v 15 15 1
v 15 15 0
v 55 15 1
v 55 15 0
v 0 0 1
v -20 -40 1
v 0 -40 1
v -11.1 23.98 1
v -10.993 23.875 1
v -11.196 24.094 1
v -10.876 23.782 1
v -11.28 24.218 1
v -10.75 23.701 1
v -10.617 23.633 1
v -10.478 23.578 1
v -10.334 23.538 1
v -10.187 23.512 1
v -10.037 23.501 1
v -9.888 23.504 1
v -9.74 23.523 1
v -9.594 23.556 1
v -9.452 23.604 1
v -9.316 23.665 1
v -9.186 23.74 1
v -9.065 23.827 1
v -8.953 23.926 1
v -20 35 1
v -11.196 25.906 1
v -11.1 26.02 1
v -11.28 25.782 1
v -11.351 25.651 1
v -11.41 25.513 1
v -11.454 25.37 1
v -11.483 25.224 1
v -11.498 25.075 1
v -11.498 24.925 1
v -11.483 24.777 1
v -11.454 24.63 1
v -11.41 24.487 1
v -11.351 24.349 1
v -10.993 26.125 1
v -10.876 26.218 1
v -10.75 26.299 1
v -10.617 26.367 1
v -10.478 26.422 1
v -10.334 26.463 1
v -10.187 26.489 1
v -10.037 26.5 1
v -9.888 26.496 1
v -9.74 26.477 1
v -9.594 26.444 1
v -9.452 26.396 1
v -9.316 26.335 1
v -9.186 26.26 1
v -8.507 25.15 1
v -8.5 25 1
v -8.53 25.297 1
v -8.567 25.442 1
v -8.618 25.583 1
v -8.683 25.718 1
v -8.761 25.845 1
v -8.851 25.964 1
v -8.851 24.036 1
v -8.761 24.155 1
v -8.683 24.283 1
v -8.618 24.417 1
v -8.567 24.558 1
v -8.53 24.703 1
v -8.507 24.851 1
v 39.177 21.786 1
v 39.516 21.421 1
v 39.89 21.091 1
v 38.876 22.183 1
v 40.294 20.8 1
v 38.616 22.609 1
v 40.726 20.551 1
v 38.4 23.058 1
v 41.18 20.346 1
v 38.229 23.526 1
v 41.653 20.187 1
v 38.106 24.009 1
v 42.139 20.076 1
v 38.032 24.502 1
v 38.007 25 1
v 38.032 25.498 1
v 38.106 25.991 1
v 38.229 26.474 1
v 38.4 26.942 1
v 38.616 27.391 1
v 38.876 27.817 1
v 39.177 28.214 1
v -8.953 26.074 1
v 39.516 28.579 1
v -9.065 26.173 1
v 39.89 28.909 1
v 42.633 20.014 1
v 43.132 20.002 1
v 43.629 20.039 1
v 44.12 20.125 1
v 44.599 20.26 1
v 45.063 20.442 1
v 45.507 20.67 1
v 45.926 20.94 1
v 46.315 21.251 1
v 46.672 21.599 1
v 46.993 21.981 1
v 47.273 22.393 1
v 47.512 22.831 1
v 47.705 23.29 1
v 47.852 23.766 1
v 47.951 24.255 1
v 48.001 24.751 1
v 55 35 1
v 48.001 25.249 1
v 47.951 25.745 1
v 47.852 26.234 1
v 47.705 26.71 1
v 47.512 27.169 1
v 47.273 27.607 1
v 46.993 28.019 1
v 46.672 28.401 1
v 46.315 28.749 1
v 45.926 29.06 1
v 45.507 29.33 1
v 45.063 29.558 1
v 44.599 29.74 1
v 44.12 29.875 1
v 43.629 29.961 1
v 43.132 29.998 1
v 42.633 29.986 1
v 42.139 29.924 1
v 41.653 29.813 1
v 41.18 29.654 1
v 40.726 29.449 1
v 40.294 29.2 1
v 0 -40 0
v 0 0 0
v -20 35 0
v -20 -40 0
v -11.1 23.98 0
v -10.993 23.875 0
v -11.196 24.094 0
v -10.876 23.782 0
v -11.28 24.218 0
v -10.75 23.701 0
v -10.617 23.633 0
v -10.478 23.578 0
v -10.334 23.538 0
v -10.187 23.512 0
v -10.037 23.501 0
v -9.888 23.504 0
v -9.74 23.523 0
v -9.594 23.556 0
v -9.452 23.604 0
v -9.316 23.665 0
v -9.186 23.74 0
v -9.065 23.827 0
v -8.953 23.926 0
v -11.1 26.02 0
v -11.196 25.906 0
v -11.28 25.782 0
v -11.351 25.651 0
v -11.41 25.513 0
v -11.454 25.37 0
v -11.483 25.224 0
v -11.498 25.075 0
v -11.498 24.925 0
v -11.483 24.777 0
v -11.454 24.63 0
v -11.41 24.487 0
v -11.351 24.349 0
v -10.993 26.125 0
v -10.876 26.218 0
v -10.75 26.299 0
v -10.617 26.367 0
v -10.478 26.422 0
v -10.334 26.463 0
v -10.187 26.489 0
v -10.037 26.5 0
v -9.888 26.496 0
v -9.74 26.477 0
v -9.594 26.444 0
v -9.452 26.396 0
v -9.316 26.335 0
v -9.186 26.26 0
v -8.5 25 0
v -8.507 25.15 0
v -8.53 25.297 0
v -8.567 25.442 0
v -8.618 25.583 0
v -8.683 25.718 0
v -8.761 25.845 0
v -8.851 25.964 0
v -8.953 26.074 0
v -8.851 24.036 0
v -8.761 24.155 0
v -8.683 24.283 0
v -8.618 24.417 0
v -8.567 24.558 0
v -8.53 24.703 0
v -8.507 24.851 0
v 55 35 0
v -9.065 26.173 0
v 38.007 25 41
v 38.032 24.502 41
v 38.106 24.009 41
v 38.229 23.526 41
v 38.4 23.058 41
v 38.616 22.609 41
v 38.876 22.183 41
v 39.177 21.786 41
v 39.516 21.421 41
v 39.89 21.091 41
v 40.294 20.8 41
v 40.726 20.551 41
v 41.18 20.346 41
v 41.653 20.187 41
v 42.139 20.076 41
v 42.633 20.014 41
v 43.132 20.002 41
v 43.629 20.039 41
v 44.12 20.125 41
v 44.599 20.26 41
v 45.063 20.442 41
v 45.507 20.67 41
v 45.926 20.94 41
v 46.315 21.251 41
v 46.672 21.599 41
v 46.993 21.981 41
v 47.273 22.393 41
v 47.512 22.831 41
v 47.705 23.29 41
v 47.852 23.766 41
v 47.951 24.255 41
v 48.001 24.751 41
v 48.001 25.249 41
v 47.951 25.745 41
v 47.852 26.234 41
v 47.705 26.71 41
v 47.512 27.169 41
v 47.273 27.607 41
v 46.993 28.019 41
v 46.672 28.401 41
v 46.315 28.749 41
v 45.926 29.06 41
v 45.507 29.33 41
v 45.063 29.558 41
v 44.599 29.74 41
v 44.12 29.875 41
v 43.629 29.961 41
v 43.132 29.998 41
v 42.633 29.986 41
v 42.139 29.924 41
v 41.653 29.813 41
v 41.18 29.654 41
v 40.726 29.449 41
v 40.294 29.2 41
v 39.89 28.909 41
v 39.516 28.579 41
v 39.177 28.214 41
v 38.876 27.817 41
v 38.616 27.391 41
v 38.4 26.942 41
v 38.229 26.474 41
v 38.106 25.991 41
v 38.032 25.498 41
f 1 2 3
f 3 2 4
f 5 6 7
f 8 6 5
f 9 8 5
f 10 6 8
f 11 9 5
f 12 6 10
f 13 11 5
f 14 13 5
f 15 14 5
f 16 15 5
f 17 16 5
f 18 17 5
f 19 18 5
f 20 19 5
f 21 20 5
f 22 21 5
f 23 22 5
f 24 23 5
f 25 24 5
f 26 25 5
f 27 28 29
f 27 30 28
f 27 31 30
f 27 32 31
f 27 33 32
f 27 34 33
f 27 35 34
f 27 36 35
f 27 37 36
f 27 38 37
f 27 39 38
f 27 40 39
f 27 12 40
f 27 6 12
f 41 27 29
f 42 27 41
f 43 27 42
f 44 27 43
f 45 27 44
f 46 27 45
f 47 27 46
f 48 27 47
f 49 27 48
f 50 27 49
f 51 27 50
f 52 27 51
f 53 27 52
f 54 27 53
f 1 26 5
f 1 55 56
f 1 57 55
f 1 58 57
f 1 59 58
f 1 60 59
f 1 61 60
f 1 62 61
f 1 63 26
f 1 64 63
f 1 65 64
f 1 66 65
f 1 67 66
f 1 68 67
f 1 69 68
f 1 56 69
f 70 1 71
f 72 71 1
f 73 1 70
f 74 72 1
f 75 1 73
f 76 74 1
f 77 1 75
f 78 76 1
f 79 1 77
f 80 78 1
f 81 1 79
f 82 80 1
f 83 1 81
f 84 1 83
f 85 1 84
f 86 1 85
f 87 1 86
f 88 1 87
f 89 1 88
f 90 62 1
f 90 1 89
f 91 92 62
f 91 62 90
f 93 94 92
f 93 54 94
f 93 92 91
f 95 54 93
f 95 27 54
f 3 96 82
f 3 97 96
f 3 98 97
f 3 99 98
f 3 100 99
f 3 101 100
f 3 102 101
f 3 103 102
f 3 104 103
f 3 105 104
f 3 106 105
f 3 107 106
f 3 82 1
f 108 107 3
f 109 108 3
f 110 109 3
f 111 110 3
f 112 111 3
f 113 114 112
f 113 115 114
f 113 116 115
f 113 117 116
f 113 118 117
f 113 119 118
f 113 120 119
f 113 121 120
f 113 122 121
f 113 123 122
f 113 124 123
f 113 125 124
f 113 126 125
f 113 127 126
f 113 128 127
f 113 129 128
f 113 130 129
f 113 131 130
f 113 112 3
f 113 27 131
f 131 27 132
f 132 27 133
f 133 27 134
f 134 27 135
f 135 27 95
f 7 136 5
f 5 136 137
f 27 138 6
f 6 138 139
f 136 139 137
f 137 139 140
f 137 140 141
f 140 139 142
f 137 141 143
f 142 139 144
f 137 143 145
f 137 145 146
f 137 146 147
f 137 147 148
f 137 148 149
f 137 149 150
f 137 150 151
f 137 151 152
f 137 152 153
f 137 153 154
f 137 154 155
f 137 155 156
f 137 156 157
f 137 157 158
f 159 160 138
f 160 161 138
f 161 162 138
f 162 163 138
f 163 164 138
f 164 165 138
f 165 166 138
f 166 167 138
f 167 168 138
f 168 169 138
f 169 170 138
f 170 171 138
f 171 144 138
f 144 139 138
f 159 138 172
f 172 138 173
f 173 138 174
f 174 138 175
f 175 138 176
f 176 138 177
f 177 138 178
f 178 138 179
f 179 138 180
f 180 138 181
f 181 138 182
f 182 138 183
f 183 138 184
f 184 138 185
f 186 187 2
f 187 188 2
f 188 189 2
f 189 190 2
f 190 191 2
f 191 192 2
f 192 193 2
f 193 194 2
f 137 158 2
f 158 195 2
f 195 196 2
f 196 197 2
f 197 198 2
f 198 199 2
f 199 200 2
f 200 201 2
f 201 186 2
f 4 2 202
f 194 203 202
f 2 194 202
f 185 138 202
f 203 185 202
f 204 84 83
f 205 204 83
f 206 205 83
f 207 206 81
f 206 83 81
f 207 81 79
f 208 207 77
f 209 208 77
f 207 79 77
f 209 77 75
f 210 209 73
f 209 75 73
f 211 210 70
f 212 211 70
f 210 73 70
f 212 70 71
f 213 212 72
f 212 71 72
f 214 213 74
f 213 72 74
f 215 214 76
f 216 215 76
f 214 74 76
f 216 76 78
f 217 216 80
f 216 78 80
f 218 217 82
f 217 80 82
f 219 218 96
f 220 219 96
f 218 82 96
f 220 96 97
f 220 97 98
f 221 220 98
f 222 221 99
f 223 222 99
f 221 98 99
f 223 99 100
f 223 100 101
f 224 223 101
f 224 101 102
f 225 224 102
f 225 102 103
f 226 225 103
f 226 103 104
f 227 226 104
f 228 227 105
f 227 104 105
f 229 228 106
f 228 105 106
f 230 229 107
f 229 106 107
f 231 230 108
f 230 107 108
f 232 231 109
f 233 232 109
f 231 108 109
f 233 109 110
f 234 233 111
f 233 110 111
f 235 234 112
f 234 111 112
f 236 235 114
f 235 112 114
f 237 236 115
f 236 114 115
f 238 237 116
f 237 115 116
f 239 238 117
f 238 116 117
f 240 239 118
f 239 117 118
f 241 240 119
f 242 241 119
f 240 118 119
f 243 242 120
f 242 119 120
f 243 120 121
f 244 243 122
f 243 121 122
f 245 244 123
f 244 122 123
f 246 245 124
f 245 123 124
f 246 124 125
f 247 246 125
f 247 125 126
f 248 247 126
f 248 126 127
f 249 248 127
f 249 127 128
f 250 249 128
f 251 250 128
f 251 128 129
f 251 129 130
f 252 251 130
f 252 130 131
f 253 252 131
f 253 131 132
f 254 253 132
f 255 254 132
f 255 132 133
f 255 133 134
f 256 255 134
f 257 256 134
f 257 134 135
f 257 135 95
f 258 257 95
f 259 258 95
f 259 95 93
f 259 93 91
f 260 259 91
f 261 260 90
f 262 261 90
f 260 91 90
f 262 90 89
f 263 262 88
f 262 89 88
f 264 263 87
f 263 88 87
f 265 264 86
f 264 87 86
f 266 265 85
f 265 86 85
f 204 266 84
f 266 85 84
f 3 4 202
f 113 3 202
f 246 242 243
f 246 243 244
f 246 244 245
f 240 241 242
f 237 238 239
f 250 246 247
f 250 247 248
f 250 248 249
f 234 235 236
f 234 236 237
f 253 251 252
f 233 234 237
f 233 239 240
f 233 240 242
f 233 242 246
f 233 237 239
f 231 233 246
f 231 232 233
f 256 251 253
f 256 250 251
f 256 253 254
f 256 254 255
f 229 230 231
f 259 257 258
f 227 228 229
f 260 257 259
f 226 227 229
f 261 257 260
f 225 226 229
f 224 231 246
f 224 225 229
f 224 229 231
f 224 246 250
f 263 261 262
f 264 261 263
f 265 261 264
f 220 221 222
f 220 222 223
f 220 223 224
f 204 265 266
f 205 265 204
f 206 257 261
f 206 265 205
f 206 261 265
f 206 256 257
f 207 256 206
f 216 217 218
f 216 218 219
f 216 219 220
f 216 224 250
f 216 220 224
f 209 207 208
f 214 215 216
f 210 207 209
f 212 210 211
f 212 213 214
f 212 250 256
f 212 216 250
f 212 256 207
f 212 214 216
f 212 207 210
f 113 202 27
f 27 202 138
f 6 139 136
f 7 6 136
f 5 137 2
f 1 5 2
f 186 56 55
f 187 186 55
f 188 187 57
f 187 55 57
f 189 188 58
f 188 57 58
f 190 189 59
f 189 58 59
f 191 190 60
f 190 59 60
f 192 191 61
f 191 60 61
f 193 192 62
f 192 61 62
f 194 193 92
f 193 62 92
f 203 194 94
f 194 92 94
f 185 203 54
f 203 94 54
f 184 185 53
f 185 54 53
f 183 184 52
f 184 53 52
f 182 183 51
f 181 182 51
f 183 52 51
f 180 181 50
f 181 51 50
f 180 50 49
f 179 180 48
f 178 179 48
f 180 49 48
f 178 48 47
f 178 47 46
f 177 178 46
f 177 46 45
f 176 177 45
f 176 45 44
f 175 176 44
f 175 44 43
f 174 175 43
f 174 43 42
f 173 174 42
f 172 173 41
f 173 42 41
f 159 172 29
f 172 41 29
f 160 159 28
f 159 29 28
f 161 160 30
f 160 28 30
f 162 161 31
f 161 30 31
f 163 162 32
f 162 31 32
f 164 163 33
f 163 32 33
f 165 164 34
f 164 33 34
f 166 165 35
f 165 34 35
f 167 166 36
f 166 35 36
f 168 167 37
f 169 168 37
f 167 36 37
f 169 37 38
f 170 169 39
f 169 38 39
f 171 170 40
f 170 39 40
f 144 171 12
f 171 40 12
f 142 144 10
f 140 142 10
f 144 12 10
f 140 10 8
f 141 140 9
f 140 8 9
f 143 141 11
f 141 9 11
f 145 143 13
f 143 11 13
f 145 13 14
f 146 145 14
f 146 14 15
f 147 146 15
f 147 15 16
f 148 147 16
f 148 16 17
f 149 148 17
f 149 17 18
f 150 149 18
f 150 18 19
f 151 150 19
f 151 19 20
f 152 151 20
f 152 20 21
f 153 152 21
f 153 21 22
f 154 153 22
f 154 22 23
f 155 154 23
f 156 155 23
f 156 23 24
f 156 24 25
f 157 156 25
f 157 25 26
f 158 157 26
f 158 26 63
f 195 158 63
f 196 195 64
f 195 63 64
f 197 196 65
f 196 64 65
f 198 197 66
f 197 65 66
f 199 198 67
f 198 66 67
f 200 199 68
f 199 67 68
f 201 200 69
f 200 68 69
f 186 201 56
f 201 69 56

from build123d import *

# Parameters (mm, degrees)
BOSS_EXTRUDE1_DEPTH = 1
SKETCH4_R           = 1.5
CUT_EXTRUDE5_DEPTH  = 1
SKETCH5_R           = 5
BOSS_EXTRUDE2_DEPTH = 40


with BuildPart() as part:
    # Sketch1 → Boss-Extrude1 (new body)
    with BuildSketch(Plane.XY):
        Polygon((-20, 35), (-20, -40), (0, -40), (0, 0), (15, 15), (55, 15), (55, 35), align=None)
    extrude(amount=BOSS_EXTRUDE1_DEPTH)

    # Sketch4 → Cut-Extrude5 (cut)
    with BuildSketch(Plane.XY.offset(1)):
        with Locations((-10, 25.000149563)):
            Circle(SKETCH4_R)
    extrude(amount=-CUT_EXTRUDE5_DEPTH, mode=Mode.SUBTRACT)

    # Sketch5 → Boss-Extrude2 (add)
    with BuildSketch(Plane.XY.offset(1)):
        with Locations(Location((43.007008147, 25, 0), (0, 0, 180))):
            Circle(SKETCH5_R)
    extrude(amount=BOSS_EXTRUDE2_DEPTH)


solid = part.part
